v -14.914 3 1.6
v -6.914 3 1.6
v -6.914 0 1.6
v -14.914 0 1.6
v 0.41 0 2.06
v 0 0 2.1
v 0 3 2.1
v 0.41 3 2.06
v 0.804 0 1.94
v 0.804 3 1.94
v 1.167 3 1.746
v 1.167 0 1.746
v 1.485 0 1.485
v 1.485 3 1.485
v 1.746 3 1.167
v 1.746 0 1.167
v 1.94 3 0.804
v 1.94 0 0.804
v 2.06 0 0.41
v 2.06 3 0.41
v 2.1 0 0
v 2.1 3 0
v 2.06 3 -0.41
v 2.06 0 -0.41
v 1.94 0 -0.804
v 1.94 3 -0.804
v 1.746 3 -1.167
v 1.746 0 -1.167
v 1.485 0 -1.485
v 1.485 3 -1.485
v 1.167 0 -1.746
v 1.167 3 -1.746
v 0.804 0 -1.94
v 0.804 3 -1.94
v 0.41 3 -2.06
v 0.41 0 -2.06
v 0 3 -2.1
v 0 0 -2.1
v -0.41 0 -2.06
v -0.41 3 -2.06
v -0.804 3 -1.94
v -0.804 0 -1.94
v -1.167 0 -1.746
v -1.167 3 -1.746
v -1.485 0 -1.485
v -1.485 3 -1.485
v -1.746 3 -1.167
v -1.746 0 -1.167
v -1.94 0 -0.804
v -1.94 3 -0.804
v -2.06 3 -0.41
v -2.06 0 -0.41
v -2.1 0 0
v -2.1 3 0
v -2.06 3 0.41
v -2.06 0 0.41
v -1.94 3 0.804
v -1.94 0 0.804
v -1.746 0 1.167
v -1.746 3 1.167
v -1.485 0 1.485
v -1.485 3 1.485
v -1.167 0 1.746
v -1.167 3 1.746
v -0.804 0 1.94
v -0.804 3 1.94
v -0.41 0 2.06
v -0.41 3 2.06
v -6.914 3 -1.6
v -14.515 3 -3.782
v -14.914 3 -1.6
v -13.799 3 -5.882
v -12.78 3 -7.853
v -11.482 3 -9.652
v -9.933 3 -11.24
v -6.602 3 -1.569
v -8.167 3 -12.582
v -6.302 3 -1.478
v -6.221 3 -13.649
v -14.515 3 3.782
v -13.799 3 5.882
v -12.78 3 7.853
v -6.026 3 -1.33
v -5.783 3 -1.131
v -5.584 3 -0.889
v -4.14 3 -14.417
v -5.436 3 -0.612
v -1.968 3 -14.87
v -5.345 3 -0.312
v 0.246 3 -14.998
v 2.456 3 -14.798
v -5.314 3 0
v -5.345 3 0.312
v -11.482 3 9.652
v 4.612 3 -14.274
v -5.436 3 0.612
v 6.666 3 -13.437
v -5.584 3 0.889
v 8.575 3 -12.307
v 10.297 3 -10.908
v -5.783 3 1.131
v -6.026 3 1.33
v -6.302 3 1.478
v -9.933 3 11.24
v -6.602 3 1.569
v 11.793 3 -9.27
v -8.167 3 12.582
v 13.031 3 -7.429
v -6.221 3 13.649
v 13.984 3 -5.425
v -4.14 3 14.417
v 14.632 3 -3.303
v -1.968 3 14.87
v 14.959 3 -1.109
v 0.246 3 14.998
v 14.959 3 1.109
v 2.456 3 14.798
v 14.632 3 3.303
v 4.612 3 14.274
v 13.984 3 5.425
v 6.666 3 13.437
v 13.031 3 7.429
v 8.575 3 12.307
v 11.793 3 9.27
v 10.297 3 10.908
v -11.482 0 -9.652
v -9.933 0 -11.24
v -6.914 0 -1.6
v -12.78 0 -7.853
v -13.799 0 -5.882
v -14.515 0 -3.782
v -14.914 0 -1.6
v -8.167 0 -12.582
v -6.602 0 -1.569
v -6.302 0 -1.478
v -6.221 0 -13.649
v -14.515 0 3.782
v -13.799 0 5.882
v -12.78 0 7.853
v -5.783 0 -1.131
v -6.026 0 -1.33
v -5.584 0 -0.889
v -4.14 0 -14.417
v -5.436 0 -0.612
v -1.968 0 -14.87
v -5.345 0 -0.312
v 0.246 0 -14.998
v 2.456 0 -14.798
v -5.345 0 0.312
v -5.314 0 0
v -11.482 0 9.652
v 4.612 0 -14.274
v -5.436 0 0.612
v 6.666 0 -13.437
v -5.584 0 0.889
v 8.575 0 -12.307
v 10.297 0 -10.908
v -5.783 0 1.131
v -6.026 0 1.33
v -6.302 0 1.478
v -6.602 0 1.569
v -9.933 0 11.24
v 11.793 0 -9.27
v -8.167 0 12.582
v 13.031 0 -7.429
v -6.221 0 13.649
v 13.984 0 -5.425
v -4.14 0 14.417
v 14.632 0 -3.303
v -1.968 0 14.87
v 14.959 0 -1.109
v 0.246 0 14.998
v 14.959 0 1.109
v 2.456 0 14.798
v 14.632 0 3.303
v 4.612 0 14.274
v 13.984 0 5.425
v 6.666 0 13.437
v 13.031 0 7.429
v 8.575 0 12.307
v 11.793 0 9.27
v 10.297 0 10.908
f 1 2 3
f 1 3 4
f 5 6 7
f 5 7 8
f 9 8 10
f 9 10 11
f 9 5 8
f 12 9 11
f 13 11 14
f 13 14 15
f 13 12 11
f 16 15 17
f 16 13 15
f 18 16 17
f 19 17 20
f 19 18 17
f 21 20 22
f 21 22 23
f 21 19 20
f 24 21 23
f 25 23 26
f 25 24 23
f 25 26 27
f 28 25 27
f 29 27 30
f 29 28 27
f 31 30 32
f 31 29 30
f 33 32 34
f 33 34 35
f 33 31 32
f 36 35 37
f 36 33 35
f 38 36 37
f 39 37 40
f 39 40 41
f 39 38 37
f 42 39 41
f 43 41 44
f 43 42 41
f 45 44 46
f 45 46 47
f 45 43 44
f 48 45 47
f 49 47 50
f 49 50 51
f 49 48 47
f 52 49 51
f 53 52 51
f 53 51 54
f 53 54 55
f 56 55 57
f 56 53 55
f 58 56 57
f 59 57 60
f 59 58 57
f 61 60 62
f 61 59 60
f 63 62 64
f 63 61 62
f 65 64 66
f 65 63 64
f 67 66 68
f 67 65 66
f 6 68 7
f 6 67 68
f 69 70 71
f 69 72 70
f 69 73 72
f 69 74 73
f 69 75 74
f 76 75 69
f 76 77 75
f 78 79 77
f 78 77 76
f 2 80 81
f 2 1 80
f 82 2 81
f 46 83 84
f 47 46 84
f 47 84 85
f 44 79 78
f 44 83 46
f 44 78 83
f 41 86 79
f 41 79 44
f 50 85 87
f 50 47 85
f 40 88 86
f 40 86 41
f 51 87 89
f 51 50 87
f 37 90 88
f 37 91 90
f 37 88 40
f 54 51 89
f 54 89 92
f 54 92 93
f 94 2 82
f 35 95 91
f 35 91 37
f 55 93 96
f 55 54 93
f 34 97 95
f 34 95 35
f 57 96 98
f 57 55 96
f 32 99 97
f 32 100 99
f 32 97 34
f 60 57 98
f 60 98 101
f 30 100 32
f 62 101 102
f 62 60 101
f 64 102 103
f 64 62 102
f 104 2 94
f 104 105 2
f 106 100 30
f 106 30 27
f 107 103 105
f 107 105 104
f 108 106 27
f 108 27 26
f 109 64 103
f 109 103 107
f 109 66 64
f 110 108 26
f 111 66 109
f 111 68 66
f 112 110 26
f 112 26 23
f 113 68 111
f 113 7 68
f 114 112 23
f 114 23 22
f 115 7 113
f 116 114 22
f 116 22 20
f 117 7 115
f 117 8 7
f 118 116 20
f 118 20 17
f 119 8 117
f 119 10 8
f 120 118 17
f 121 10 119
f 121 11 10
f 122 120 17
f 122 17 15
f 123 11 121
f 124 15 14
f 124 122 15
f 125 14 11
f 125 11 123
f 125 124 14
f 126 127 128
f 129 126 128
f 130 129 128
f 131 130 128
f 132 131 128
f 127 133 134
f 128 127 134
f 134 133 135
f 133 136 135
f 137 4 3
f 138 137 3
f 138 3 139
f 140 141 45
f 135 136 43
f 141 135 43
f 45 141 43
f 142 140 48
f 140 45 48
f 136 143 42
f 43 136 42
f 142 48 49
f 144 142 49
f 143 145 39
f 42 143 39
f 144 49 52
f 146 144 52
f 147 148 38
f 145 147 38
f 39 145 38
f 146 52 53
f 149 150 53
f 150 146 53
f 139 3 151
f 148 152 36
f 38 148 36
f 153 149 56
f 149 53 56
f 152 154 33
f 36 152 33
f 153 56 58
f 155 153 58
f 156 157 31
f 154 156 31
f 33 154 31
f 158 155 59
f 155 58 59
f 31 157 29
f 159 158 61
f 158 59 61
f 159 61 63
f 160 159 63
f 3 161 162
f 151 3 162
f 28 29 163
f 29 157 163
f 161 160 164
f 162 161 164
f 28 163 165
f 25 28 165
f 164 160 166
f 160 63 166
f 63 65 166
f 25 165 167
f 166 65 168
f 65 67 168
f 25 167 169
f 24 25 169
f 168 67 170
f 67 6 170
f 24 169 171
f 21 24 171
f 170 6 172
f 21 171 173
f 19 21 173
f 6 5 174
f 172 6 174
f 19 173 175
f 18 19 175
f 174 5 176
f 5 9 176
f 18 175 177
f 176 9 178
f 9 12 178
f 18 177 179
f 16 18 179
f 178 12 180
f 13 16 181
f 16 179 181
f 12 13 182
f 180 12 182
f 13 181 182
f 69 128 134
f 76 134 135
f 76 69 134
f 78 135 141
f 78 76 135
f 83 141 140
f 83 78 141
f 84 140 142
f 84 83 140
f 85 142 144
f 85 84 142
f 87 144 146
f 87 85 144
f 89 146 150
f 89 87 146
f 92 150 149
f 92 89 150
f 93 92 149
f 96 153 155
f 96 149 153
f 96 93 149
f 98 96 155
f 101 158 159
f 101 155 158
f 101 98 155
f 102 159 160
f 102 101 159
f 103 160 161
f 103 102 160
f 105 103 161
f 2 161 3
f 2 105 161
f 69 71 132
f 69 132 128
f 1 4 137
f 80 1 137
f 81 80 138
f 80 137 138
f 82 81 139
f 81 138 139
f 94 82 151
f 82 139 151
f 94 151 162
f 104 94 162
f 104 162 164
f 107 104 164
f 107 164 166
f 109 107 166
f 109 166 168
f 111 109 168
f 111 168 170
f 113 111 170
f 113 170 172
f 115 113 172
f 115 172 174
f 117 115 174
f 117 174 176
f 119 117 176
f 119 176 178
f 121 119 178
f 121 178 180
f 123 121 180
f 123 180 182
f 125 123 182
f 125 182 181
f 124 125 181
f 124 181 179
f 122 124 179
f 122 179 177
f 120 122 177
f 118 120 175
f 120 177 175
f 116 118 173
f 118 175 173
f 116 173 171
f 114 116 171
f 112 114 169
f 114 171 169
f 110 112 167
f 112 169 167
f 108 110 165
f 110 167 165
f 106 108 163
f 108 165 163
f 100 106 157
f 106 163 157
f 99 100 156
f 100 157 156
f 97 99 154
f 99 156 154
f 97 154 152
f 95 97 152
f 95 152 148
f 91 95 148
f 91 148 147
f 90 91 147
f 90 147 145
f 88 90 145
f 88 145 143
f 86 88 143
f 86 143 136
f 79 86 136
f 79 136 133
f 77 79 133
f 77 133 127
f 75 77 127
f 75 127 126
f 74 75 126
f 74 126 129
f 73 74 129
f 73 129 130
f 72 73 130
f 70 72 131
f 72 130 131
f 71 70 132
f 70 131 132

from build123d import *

# Parameters (mm, degrees)
SKETCH_1_R          = 15
SKETCH_1_R_2        = 2.1
EXTRUDE_1_DEPTH     = 3
CUT_EXTRUDE_1_DEPTH = 10


with BuildPart() as part:
    # ｽｹｯﾁ1 → ﾎﾞｽ - 押し出し1 (new body)
    with BuildSketch(Plane(origin=(0, 0, 0), x_dir=(1, 0, 0), z_dir=(0, 1, 0))):
        with Locations(Location((0, 0, 0), (0, 0, 270))):
            Circle(SKETCH_1_R)
        with Locations(Location((0, 0, 0), (0, 0, 270))):
            Circle(SKETCH_1_R_2, mode=Mode.SUBTRACT)
    extrude(amount=EXTRUDE_1_DEPTH)

    # ｽｹｯﾁ2 → ｶｯﾄ - 押し出し1 (cut)
    with BuildSketch(Plane(origin=(0, 3, 0), x_dir=(1, 0, 0), z_dir=(0, 1, 0))):
        with BuildLine():
            Line((-14.91442255, 1.6), (-6.91442255, 1.6))
            ThreePointArc((-6.91442255, 1.6), (-5.31442255, 0), (-6.91442255, -1.6))
            Line((-6.91442255, -1.6), (-14.91442255, -1.6))
            ThreePointArc((-14.91442255, -1.6), (-16.51442255, 0), (-14.91442255, 1.6))
        make_face()
    extrude(amount=-CUT_EXTRUDE_1_DEPTH, mode=Mode.SUBTRACT)


solid = part.part
